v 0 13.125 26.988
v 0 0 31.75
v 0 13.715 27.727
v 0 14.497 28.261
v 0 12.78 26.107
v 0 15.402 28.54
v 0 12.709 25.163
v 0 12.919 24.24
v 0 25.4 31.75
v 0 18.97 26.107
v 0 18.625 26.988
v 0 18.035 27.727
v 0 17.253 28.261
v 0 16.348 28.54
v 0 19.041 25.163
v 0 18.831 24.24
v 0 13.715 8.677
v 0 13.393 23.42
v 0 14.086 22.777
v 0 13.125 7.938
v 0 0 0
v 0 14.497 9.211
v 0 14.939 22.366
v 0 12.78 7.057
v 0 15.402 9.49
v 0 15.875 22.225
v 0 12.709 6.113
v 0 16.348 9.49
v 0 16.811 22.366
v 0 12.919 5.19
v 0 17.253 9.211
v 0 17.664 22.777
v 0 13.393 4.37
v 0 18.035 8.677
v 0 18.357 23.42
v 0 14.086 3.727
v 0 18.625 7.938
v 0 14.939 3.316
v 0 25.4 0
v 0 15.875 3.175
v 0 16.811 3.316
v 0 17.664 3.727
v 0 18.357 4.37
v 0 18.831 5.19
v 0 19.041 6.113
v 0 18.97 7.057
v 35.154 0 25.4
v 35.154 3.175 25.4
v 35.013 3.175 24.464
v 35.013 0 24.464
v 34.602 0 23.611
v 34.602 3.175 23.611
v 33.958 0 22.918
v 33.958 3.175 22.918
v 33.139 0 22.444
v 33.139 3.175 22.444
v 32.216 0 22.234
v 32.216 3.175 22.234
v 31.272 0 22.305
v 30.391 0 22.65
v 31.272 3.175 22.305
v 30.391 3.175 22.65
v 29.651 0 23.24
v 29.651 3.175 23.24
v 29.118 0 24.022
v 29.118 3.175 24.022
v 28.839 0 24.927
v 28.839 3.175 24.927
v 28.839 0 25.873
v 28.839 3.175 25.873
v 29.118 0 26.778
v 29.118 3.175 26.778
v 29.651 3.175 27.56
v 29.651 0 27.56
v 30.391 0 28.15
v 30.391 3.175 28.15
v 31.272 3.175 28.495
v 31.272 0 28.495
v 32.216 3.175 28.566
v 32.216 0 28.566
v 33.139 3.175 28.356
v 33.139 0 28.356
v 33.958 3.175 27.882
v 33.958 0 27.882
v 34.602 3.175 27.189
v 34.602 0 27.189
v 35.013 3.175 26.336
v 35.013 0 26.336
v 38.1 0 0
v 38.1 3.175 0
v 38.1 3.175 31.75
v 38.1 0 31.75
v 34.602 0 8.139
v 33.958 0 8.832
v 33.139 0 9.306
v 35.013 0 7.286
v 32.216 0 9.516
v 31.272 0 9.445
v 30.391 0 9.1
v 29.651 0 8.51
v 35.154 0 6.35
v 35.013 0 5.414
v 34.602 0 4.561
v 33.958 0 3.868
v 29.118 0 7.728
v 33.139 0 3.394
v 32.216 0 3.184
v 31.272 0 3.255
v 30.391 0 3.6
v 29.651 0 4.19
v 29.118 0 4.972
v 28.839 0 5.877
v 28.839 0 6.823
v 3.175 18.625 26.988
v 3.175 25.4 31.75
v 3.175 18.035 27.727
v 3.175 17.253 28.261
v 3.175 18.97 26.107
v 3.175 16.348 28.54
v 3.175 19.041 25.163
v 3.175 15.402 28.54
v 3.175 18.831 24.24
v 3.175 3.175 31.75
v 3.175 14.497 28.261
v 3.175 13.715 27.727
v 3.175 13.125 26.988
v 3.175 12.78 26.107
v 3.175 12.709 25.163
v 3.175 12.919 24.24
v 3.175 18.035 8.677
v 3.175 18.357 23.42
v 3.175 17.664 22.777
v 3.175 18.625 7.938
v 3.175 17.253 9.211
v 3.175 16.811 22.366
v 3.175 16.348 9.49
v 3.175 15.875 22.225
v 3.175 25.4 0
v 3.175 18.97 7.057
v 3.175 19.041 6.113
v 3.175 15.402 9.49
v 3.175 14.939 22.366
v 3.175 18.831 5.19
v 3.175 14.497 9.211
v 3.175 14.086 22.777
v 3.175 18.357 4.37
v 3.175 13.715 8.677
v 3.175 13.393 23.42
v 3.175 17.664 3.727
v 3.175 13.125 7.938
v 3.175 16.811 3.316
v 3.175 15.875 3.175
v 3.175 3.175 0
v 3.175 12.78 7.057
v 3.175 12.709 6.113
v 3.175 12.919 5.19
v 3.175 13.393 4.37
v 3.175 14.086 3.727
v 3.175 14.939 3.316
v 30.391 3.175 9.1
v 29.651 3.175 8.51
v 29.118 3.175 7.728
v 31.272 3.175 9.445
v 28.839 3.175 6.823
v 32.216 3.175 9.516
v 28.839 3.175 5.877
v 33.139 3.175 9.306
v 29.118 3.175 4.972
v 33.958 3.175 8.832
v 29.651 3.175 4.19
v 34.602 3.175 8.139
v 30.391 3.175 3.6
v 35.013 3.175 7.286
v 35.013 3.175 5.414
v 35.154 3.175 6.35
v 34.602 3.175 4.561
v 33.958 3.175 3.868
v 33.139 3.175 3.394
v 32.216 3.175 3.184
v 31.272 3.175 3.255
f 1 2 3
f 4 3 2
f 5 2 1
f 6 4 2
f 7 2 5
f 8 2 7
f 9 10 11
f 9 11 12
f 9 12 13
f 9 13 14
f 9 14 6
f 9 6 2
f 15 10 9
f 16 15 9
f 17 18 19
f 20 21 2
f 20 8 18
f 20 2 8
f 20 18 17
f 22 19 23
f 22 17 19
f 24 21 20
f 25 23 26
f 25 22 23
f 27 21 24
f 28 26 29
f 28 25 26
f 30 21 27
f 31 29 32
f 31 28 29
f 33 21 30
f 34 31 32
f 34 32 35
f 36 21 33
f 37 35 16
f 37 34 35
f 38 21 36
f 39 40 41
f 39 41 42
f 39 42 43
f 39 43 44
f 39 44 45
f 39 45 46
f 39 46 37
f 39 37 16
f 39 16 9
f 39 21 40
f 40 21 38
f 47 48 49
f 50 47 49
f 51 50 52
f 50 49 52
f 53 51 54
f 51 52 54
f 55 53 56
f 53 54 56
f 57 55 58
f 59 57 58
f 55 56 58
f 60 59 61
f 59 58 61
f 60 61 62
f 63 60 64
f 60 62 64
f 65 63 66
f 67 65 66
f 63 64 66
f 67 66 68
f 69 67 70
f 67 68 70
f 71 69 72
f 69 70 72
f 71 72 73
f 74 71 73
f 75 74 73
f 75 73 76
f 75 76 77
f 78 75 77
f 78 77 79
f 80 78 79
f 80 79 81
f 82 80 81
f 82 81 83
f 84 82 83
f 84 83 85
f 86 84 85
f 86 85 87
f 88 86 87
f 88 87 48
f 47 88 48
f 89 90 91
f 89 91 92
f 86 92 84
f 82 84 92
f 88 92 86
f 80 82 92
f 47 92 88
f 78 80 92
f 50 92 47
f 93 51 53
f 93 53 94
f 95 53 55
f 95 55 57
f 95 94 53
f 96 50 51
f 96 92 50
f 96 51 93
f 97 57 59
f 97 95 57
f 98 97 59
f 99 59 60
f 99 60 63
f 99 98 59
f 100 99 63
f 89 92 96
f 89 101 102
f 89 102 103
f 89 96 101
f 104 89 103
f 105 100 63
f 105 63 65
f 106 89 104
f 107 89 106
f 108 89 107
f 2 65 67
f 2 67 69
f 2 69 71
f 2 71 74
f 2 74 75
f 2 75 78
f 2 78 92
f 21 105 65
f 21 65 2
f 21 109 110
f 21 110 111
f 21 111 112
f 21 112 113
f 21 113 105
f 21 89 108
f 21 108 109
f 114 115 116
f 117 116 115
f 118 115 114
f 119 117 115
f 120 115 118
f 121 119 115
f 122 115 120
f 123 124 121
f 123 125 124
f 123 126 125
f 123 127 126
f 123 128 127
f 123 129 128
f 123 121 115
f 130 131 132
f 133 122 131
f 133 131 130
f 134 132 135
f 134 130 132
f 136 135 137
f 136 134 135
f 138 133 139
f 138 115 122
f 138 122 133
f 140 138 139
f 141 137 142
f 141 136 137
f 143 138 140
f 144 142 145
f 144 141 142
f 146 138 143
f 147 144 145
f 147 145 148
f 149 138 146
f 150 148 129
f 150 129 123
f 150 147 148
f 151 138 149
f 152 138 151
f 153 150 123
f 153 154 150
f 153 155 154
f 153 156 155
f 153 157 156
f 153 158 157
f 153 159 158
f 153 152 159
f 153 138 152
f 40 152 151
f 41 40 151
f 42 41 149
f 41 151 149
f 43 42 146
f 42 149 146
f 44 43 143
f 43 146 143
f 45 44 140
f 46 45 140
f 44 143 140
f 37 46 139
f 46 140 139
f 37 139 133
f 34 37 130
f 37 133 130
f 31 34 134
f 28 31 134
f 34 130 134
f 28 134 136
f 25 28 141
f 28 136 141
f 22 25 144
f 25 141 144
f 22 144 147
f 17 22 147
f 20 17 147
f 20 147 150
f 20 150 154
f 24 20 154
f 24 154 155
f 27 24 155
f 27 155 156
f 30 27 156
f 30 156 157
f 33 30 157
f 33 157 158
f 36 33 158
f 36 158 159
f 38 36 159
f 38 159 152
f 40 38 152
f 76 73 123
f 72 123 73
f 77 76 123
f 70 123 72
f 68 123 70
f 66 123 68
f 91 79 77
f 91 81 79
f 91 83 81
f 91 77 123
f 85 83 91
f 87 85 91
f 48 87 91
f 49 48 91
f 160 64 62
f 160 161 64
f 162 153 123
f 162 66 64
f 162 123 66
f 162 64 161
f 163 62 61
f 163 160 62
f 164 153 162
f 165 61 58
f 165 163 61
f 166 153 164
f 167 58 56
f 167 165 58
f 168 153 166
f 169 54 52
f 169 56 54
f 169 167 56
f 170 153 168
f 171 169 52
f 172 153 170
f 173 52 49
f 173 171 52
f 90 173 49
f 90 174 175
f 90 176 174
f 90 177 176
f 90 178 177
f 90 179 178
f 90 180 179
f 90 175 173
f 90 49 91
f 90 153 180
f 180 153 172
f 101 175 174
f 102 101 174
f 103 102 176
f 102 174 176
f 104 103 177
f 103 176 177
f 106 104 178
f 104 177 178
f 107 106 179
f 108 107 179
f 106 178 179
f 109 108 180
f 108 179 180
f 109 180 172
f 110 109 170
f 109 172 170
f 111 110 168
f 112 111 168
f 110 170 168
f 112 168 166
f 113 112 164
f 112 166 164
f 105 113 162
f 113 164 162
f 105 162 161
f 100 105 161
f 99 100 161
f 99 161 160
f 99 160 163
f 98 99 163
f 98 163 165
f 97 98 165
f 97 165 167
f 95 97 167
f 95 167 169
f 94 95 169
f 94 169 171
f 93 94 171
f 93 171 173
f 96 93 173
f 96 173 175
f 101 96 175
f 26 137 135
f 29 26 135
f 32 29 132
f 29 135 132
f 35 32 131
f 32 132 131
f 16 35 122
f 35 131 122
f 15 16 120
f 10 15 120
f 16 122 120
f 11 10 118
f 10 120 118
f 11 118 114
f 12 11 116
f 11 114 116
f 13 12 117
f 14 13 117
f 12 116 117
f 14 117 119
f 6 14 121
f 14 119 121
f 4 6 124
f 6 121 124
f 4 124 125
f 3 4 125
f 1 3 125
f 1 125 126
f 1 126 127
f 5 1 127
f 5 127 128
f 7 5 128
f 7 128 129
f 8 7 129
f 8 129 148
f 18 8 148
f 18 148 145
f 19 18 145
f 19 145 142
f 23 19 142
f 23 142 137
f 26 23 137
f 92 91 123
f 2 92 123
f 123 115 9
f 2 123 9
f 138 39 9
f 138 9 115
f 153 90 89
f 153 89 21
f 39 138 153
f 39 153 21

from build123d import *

# Parameters (mm, degrees)
BOSS_EXTRUDE1_DEPTH = 31.75
SKETCH2_R           = 3.175
CUT_EXTRUDE1_DEPTH  = 4.175
SKETCH3_R           = 3.175
CUT_EXTRUDE2_DEPTH  = 4.175


with BuildPart() as part:
    # Sketch1 → Boss-Extrude1 (new body)
    with BuildSketch(Plane.XY):
        Polygon((0, 0), (0, 25.4), (3.175, 25.4), (3.175, 3.175), (38.1, 3.175), (38.1, 0), align=None)
    extrude(amount=BOSS_EXTRUDE1_DEPTH)

    # Sketch2 → Cut-Extrude1 (cut, through all)
    with BuildSketch(Plane(origin=(0, 3.175, 0), x_dir=(1, 0, 0), z_dir=(0, 1, 0))):
        with Locations((31.9786, -6.35)):
            Circle(SKETCH2_R)
        with Locations((31.9786, -25.4)):
            Circle(SKETCH2_R)
    extrude(amount=-CUT_EXTRUDE1_DEPTH, mode=Mode.SUBTRACT)

    # Sketch3 → Cut-Extrude2 (cut, through all)
    with BuildSketch(Plane(origin=(3.175, 0, 0), x_dir=(0, 0, -1), z_dir=(1, 0, 0))):
        with Locations((-25.4, 15.875)):
            Circle(SKETCH3_R)
        with Locations((-6.35, 15.875)):
            Circle(SKETCH3_R)
    extrude(amount=-CUT_EXTRUDE2_DEPTH, mode=Mode.SUBTRACT)


solid = part.part
